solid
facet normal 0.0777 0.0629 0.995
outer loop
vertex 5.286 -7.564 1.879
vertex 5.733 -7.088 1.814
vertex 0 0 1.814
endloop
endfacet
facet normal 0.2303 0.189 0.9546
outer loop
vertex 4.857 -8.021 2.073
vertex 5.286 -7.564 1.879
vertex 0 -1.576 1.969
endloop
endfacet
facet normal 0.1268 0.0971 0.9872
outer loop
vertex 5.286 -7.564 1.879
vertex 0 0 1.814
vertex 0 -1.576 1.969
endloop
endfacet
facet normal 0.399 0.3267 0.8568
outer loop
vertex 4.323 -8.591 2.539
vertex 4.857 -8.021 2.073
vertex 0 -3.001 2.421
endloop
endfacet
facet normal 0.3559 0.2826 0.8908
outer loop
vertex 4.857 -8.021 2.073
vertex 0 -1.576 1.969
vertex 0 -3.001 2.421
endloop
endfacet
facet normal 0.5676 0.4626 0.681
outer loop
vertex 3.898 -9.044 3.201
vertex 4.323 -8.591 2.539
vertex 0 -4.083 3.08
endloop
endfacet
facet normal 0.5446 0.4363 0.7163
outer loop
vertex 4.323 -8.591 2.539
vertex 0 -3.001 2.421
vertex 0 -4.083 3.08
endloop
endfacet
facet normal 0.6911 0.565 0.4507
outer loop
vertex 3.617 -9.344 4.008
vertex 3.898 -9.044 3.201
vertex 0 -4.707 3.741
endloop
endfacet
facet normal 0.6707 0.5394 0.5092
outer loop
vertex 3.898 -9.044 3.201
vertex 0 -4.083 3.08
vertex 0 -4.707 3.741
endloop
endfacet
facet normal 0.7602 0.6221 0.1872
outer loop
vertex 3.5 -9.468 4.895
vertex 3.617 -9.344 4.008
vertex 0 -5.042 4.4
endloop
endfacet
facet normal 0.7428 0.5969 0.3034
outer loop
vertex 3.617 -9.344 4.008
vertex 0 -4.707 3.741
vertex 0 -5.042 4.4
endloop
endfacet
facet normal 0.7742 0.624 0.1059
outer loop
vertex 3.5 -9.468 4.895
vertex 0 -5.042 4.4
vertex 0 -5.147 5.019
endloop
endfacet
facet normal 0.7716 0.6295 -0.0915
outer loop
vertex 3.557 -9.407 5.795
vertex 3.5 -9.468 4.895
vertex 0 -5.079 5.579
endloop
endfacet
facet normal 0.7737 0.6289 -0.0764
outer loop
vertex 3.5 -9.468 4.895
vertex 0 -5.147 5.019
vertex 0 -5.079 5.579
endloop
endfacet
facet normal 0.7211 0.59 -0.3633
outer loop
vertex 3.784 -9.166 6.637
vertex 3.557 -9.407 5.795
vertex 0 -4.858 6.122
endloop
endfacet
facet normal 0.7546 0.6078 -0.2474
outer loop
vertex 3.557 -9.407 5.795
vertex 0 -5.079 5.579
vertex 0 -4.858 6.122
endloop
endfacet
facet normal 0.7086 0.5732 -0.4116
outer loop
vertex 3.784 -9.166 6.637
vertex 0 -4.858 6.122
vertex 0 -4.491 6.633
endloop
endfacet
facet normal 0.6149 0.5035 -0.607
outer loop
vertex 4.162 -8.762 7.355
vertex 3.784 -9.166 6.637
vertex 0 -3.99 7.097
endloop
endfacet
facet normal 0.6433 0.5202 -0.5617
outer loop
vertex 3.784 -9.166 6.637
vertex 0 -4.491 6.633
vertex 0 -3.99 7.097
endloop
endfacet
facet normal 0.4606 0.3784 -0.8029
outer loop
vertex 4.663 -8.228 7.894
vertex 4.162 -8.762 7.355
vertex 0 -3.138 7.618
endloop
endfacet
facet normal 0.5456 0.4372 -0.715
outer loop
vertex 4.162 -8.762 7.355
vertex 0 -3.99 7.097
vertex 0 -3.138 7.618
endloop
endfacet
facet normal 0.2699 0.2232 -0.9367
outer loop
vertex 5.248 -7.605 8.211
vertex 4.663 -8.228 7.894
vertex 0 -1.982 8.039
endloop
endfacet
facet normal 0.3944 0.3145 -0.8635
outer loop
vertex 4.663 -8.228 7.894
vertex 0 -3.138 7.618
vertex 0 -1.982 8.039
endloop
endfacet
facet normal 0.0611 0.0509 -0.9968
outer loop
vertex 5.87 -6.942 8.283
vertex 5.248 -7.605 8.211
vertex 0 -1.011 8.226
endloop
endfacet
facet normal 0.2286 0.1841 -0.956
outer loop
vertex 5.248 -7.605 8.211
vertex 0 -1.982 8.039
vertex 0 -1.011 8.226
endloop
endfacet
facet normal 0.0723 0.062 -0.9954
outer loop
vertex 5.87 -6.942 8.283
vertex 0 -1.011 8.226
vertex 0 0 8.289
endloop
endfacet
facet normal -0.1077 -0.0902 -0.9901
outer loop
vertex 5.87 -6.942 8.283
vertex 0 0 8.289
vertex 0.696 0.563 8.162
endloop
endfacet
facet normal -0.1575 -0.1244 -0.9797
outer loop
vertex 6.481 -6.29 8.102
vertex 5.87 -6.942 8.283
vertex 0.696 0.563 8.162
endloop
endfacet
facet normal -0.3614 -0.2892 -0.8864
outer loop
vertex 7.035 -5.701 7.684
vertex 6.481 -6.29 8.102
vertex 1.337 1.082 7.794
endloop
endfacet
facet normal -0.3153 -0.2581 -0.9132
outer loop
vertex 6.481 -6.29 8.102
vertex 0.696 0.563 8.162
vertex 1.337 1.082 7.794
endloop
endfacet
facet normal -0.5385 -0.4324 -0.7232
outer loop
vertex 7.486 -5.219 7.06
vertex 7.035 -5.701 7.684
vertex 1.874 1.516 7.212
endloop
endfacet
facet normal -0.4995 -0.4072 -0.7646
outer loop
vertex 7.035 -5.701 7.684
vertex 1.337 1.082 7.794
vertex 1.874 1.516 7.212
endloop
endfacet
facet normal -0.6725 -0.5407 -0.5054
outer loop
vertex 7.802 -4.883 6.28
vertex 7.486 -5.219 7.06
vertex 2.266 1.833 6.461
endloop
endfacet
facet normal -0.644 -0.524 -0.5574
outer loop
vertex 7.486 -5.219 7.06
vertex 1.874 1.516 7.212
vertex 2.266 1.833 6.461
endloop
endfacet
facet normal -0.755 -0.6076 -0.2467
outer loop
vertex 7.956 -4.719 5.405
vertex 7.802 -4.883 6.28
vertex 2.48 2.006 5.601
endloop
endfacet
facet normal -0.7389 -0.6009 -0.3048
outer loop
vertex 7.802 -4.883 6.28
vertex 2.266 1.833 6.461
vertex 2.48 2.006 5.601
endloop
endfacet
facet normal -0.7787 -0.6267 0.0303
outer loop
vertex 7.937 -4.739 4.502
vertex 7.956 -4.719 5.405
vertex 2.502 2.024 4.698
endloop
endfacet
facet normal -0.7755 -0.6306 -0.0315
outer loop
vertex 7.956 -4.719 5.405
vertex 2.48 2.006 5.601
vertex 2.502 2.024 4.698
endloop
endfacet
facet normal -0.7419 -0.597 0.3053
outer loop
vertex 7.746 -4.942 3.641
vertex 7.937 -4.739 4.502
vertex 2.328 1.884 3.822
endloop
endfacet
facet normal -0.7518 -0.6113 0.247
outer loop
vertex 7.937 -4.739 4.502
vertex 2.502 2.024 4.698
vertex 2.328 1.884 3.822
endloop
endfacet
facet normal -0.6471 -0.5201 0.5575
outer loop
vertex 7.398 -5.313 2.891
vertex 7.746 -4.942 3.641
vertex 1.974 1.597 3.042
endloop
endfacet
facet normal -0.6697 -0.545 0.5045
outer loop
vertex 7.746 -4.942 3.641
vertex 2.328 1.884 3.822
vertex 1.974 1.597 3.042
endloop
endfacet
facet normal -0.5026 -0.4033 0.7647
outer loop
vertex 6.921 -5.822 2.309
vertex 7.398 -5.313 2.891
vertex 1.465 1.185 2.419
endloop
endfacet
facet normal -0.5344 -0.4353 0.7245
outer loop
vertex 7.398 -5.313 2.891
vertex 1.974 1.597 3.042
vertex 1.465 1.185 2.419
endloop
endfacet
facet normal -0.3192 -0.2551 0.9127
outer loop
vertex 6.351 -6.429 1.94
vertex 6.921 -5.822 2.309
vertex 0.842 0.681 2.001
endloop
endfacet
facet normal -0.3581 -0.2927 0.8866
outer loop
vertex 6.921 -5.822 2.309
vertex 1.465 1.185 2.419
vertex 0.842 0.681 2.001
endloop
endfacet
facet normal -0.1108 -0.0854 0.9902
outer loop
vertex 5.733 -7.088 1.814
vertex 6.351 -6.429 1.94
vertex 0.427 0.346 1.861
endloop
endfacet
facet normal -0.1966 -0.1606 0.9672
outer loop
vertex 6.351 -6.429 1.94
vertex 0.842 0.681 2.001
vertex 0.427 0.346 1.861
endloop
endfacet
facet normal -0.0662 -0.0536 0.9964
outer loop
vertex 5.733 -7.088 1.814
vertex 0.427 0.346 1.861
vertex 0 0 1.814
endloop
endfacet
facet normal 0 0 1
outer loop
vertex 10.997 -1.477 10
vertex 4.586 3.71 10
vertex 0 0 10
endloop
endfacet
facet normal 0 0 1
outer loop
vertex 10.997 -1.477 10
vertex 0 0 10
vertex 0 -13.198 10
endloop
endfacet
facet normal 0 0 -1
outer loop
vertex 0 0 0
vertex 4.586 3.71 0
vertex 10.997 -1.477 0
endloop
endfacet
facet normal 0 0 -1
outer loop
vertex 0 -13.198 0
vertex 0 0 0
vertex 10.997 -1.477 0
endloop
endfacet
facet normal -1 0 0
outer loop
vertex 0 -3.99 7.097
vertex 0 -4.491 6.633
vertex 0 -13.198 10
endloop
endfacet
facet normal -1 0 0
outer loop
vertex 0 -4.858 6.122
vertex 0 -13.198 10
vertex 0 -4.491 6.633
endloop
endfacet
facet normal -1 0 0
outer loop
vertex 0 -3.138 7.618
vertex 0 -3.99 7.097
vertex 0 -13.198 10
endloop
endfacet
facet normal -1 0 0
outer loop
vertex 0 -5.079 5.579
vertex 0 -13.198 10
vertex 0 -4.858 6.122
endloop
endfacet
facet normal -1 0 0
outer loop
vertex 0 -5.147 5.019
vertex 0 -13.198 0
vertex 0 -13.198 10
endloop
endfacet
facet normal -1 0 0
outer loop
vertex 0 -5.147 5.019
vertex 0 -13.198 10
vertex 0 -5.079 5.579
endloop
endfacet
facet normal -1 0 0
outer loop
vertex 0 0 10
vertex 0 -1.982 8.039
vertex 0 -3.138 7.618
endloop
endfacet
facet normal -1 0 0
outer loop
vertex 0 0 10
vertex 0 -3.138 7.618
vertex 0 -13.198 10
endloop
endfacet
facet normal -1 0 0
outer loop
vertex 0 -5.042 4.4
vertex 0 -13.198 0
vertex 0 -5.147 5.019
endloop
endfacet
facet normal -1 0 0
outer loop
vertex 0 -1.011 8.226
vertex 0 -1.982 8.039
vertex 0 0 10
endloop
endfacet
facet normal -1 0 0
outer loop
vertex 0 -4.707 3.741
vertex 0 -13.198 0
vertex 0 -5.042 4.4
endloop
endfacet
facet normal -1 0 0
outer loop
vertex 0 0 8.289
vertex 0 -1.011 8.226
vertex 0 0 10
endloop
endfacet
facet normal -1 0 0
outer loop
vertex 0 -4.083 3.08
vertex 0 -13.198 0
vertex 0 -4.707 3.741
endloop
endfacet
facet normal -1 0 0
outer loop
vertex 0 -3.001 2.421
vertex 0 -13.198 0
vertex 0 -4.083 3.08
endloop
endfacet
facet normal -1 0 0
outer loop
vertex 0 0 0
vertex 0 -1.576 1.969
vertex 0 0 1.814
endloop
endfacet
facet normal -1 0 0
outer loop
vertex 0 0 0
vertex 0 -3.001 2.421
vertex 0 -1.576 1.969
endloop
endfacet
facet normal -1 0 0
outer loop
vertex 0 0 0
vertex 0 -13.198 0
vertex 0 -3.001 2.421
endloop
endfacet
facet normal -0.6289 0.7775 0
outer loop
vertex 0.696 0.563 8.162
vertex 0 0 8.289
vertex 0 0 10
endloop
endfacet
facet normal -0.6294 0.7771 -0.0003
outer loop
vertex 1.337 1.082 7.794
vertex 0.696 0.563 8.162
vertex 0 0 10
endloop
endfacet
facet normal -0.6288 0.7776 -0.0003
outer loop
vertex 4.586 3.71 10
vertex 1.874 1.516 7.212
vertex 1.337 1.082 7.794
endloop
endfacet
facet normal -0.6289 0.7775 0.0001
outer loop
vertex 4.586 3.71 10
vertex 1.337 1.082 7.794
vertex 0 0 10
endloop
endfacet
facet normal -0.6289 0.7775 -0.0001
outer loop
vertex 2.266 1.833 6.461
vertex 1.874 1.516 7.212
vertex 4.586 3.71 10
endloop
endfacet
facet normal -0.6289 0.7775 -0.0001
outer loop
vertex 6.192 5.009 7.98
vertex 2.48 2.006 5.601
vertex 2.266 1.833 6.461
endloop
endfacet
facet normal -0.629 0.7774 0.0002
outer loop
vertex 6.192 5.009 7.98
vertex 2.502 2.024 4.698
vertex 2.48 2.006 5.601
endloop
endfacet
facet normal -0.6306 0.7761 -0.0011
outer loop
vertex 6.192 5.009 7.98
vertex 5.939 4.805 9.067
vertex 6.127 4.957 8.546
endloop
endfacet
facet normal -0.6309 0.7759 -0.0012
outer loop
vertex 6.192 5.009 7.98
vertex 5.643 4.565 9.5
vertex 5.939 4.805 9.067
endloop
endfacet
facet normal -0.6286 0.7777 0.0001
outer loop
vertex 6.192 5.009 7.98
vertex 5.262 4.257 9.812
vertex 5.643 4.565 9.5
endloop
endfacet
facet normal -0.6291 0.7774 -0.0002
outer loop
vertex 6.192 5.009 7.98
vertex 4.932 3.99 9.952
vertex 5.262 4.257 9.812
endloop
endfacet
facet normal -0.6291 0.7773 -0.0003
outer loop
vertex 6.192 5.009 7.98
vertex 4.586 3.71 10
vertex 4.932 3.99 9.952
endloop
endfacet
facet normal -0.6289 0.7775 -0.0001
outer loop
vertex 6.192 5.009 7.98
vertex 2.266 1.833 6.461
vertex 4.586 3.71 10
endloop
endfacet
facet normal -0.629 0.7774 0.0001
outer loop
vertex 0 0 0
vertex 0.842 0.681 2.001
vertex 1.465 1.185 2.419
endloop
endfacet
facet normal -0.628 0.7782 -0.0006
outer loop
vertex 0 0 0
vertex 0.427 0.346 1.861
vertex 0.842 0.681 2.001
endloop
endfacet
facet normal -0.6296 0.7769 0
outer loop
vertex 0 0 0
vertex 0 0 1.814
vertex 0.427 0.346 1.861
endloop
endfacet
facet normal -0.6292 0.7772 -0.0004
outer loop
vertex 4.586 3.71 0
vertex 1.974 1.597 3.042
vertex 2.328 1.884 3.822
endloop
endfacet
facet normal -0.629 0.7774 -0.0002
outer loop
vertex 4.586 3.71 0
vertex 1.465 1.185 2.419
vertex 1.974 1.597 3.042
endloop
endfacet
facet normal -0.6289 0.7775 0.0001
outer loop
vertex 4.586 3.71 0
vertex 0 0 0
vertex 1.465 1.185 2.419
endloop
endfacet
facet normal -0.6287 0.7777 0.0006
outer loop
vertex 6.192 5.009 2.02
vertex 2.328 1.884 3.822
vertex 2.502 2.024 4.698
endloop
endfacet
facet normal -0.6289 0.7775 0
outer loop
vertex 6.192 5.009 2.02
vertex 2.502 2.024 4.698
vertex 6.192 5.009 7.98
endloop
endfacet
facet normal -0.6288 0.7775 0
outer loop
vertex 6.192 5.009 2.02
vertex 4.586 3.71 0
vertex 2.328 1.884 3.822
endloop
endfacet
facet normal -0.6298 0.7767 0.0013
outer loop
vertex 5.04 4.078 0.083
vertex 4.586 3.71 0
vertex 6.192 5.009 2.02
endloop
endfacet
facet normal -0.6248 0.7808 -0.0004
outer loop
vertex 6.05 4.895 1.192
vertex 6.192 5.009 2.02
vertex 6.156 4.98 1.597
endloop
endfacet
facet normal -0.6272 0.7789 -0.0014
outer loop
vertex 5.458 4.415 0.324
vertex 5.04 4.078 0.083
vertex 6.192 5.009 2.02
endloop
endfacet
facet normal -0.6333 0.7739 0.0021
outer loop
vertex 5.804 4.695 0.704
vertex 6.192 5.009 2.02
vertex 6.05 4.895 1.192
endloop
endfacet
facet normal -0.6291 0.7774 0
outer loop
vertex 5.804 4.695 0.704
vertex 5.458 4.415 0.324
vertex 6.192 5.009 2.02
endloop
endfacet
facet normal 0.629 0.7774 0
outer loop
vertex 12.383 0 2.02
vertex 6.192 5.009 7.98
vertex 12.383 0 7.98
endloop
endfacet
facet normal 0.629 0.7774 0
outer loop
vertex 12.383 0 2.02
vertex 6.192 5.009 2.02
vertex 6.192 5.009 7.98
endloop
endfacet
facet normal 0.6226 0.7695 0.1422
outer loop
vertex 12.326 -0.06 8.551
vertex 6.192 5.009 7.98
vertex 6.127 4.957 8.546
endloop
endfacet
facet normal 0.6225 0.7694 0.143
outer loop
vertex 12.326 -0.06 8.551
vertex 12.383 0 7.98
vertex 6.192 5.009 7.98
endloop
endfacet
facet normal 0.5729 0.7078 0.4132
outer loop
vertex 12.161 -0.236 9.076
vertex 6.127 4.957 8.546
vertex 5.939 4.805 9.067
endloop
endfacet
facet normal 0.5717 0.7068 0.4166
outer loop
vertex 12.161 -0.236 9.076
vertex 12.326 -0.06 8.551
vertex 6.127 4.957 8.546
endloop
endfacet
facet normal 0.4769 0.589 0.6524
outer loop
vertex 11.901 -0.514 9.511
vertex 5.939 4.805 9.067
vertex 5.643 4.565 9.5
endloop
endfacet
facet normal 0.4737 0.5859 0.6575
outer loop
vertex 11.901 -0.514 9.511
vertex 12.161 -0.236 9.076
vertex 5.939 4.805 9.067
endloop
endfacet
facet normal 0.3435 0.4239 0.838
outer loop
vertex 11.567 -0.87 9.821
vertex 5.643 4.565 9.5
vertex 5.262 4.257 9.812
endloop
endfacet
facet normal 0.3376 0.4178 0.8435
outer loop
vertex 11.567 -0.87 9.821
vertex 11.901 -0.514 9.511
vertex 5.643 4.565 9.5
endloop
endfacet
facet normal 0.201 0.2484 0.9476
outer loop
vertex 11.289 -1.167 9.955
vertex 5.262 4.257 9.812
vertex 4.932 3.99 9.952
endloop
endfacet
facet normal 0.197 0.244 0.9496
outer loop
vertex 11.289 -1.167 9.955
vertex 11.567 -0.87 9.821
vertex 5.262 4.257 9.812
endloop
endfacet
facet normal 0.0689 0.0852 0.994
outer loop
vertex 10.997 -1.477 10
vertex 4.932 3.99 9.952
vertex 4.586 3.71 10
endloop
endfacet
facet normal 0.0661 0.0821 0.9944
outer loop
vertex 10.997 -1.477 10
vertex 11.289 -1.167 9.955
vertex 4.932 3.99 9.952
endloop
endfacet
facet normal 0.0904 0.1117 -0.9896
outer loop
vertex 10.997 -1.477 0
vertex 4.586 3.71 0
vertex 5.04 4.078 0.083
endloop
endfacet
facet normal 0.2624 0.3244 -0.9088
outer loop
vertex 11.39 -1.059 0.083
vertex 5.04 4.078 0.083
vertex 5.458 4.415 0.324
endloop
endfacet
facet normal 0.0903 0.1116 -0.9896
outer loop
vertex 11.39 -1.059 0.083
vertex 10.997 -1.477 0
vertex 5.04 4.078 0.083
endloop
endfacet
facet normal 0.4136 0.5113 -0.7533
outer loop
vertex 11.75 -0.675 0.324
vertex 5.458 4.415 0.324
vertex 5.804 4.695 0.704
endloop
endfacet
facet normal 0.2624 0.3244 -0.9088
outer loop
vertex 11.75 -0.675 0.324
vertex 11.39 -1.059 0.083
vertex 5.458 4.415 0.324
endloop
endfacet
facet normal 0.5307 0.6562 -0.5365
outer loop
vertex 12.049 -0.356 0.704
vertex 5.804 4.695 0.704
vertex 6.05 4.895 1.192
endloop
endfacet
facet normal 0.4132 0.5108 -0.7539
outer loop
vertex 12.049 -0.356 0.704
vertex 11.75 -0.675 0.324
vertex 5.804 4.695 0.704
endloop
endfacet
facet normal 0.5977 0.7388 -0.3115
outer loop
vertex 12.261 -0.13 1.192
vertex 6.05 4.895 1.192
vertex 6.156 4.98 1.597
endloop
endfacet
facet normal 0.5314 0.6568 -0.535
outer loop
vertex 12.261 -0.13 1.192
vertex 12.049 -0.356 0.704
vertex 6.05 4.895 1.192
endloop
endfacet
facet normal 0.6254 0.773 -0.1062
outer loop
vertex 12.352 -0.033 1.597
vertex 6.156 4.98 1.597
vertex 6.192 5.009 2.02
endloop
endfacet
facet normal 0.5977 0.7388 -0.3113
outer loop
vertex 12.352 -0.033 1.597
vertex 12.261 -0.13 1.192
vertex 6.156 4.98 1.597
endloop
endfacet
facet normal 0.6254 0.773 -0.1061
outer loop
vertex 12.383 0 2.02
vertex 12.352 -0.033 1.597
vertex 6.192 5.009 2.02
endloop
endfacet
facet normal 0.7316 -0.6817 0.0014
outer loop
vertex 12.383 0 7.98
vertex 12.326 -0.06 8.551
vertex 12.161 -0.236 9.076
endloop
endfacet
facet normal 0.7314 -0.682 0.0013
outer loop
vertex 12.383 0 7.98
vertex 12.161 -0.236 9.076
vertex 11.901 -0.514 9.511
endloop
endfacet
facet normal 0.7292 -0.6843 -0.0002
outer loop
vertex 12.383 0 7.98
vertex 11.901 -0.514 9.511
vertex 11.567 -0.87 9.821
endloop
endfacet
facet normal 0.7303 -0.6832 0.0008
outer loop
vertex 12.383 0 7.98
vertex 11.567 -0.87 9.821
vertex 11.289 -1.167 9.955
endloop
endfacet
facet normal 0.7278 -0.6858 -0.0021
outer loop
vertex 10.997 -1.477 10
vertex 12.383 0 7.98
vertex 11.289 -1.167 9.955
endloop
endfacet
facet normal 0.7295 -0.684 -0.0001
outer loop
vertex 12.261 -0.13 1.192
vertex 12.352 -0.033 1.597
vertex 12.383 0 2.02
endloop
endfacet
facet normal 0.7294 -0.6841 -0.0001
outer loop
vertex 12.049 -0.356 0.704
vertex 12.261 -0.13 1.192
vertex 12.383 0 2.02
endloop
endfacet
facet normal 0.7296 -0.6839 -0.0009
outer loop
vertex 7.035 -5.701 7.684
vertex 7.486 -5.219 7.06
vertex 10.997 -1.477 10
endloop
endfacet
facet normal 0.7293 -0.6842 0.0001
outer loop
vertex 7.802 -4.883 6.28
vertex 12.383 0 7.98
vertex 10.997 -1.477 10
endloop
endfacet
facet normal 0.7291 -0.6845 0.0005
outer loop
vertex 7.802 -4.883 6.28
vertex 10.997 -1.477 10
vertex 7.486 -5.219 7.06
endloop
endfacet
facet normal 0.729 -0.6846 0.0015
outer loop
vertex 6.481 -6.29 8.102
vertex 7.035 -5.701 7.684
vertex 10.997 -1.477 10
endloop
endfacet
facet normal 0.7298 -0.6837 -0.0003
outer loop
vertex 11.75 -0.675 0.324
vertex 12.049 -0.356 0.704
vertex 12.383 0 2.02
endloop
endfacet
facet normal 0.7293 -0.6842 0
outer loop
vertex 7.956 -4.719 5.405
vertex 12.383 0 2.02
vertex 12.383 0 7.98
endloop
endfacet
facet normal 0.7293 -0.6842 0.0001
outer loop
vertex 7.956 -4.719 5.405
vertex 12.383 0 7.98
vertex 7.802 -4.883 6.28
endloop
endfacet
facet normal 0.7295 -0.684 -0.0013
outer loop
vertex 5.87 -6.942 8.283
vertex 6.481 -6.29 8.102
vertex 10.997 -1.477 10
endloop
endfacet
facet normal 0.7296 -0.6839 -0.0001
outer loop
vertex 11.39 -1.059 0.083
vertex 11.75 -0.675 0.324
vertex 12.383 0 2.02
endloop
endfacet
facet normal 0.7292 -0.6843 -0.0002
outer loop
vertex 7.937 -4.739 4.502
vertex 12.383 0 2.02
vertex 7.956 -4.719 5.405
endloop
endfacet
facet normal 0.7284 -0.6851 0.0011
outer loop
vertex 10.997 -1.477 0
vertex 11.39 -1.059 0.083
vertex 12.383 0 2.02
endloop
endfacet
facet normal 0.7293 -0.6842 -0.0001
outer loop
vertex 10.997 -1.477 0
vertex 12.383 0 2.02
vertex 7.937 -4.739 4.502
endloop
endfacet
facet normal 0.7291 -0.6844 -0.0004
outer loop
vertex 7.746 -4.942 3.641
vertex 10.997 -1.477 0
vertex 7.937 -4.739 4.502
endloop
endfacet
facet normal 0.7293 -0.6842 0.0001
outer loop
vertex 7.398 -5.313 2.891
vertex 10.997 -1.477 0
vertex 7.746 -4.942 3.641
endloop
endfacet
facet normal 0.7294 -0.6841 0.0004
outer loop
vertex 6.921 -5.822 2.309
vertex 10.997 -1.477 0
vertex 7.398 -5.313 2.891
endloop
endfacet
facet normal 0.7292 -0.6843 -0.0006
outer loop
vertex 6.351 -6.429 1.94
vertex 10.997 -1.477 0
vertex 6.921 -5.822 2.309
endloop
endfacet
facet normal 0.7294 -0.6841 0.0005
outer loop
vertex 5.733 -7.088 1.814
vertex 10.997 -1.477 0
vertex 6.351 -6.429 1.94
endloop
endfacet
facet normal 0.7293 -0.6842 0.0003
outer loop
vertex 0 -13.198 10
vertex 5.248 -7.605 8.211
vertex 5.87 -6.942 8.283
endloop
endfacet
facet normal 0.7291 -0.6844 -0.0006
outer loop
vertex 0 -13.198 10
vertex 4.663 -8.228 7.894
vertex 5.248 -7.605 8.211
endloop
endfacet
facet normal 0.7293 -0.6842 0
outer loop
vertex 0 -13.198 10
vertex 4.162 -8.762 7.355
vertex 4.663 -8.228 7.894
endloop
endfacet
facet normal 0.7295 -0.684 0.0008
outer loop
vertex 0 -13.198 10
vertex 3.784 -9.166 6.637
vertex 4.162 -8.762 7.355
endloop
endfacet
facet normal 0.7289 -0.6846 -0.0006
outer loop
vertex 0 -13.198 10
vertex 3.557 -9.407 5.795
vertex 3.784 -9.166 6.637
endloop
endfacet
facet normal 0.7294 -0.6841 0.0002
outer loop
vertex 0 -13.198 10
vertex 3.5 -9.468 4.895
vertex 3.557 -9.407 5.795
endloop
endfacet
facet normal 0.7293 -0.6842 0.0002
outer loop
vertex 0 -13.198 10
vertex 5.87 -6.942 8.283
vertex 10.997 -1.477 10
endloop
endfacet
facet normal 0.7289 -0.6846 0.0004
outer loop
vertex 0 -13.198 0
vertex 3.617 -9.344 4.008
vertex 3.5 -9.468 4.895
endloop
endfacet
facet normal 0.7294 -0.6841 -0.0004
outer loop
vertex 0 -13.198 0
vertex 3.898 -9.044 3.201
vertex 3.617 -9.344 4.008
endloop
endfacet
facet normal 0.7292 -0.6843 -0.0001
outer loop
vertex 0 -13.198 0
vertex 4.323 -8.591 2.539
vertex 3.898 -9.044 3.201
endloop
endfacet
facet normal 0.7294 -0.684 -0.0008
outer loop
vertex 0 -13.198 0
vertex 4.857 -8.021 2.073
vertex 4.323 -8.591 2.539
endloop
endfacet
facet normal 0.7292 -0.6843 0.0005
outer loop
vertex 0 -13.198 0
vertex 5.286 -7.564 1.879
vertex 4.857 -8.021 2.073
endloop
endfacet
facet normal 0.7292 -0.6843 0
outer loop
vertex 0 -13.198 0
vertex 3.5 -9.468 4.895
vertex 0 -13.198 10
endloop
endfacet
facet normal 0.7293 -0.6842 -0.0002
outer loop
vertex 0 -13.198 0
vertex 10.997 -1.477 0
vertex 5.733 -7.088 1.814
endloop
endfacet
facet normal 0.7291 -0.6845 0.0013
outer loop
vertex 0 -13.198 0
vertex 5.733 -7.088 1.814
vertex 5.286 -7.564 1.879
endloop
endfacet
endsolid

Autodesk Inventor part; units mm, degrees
ref_plane "YZ Plane" through (0, 0, 0) normal (1, 0, 0) x (0, 1, 0)
ref_plane "XZ Plane" through (0, 0, 0) normal (0, 1, 0) x (-1, 0, 0)
ref_plane "XY Plane" through (0, 0, 0) normal (0, 0, 1) x (1, 0, 0)
sketch "Sketch1" plane through (0, 0, 0) normal (0, 0, 1) x (1, 0, 0)
  line L0 (0, 0) -> (6.1915, 5.0087)
  line L1 (6.1915, 5.0087) -> (12.383, 0)
  line L2 (12.383, 0) -> (0, -13.1985)
  line L3 (0, -13.1985) -> (0, 0)
  point P0 (5.6638, -7.1617)
  dimension "d2" = 7.854
  dimension "d3" = 7.9638
  dimension "d4" = 18.0981
extrude "Extrusion1" add sketch "Sketch1" along normal blind 10
sketch "Sketch3" plane through (0, 0, 10) normal (-0.6289, 0.7775, 0) x (0, 0, -1)
  circle A0 centre (4.9487, 0) radius 3.2373
  point P0 (10, 0)
extrude "Extrusion2" cut sketch "Sketch3" against normal blind 10
fillet "Fillet1" radius 2.02 2 edges at (9.2873, 2.5044, 10) (9.2873, 2.5044, 0)
properties part number "My really cool, really epic hole in a ramp"
